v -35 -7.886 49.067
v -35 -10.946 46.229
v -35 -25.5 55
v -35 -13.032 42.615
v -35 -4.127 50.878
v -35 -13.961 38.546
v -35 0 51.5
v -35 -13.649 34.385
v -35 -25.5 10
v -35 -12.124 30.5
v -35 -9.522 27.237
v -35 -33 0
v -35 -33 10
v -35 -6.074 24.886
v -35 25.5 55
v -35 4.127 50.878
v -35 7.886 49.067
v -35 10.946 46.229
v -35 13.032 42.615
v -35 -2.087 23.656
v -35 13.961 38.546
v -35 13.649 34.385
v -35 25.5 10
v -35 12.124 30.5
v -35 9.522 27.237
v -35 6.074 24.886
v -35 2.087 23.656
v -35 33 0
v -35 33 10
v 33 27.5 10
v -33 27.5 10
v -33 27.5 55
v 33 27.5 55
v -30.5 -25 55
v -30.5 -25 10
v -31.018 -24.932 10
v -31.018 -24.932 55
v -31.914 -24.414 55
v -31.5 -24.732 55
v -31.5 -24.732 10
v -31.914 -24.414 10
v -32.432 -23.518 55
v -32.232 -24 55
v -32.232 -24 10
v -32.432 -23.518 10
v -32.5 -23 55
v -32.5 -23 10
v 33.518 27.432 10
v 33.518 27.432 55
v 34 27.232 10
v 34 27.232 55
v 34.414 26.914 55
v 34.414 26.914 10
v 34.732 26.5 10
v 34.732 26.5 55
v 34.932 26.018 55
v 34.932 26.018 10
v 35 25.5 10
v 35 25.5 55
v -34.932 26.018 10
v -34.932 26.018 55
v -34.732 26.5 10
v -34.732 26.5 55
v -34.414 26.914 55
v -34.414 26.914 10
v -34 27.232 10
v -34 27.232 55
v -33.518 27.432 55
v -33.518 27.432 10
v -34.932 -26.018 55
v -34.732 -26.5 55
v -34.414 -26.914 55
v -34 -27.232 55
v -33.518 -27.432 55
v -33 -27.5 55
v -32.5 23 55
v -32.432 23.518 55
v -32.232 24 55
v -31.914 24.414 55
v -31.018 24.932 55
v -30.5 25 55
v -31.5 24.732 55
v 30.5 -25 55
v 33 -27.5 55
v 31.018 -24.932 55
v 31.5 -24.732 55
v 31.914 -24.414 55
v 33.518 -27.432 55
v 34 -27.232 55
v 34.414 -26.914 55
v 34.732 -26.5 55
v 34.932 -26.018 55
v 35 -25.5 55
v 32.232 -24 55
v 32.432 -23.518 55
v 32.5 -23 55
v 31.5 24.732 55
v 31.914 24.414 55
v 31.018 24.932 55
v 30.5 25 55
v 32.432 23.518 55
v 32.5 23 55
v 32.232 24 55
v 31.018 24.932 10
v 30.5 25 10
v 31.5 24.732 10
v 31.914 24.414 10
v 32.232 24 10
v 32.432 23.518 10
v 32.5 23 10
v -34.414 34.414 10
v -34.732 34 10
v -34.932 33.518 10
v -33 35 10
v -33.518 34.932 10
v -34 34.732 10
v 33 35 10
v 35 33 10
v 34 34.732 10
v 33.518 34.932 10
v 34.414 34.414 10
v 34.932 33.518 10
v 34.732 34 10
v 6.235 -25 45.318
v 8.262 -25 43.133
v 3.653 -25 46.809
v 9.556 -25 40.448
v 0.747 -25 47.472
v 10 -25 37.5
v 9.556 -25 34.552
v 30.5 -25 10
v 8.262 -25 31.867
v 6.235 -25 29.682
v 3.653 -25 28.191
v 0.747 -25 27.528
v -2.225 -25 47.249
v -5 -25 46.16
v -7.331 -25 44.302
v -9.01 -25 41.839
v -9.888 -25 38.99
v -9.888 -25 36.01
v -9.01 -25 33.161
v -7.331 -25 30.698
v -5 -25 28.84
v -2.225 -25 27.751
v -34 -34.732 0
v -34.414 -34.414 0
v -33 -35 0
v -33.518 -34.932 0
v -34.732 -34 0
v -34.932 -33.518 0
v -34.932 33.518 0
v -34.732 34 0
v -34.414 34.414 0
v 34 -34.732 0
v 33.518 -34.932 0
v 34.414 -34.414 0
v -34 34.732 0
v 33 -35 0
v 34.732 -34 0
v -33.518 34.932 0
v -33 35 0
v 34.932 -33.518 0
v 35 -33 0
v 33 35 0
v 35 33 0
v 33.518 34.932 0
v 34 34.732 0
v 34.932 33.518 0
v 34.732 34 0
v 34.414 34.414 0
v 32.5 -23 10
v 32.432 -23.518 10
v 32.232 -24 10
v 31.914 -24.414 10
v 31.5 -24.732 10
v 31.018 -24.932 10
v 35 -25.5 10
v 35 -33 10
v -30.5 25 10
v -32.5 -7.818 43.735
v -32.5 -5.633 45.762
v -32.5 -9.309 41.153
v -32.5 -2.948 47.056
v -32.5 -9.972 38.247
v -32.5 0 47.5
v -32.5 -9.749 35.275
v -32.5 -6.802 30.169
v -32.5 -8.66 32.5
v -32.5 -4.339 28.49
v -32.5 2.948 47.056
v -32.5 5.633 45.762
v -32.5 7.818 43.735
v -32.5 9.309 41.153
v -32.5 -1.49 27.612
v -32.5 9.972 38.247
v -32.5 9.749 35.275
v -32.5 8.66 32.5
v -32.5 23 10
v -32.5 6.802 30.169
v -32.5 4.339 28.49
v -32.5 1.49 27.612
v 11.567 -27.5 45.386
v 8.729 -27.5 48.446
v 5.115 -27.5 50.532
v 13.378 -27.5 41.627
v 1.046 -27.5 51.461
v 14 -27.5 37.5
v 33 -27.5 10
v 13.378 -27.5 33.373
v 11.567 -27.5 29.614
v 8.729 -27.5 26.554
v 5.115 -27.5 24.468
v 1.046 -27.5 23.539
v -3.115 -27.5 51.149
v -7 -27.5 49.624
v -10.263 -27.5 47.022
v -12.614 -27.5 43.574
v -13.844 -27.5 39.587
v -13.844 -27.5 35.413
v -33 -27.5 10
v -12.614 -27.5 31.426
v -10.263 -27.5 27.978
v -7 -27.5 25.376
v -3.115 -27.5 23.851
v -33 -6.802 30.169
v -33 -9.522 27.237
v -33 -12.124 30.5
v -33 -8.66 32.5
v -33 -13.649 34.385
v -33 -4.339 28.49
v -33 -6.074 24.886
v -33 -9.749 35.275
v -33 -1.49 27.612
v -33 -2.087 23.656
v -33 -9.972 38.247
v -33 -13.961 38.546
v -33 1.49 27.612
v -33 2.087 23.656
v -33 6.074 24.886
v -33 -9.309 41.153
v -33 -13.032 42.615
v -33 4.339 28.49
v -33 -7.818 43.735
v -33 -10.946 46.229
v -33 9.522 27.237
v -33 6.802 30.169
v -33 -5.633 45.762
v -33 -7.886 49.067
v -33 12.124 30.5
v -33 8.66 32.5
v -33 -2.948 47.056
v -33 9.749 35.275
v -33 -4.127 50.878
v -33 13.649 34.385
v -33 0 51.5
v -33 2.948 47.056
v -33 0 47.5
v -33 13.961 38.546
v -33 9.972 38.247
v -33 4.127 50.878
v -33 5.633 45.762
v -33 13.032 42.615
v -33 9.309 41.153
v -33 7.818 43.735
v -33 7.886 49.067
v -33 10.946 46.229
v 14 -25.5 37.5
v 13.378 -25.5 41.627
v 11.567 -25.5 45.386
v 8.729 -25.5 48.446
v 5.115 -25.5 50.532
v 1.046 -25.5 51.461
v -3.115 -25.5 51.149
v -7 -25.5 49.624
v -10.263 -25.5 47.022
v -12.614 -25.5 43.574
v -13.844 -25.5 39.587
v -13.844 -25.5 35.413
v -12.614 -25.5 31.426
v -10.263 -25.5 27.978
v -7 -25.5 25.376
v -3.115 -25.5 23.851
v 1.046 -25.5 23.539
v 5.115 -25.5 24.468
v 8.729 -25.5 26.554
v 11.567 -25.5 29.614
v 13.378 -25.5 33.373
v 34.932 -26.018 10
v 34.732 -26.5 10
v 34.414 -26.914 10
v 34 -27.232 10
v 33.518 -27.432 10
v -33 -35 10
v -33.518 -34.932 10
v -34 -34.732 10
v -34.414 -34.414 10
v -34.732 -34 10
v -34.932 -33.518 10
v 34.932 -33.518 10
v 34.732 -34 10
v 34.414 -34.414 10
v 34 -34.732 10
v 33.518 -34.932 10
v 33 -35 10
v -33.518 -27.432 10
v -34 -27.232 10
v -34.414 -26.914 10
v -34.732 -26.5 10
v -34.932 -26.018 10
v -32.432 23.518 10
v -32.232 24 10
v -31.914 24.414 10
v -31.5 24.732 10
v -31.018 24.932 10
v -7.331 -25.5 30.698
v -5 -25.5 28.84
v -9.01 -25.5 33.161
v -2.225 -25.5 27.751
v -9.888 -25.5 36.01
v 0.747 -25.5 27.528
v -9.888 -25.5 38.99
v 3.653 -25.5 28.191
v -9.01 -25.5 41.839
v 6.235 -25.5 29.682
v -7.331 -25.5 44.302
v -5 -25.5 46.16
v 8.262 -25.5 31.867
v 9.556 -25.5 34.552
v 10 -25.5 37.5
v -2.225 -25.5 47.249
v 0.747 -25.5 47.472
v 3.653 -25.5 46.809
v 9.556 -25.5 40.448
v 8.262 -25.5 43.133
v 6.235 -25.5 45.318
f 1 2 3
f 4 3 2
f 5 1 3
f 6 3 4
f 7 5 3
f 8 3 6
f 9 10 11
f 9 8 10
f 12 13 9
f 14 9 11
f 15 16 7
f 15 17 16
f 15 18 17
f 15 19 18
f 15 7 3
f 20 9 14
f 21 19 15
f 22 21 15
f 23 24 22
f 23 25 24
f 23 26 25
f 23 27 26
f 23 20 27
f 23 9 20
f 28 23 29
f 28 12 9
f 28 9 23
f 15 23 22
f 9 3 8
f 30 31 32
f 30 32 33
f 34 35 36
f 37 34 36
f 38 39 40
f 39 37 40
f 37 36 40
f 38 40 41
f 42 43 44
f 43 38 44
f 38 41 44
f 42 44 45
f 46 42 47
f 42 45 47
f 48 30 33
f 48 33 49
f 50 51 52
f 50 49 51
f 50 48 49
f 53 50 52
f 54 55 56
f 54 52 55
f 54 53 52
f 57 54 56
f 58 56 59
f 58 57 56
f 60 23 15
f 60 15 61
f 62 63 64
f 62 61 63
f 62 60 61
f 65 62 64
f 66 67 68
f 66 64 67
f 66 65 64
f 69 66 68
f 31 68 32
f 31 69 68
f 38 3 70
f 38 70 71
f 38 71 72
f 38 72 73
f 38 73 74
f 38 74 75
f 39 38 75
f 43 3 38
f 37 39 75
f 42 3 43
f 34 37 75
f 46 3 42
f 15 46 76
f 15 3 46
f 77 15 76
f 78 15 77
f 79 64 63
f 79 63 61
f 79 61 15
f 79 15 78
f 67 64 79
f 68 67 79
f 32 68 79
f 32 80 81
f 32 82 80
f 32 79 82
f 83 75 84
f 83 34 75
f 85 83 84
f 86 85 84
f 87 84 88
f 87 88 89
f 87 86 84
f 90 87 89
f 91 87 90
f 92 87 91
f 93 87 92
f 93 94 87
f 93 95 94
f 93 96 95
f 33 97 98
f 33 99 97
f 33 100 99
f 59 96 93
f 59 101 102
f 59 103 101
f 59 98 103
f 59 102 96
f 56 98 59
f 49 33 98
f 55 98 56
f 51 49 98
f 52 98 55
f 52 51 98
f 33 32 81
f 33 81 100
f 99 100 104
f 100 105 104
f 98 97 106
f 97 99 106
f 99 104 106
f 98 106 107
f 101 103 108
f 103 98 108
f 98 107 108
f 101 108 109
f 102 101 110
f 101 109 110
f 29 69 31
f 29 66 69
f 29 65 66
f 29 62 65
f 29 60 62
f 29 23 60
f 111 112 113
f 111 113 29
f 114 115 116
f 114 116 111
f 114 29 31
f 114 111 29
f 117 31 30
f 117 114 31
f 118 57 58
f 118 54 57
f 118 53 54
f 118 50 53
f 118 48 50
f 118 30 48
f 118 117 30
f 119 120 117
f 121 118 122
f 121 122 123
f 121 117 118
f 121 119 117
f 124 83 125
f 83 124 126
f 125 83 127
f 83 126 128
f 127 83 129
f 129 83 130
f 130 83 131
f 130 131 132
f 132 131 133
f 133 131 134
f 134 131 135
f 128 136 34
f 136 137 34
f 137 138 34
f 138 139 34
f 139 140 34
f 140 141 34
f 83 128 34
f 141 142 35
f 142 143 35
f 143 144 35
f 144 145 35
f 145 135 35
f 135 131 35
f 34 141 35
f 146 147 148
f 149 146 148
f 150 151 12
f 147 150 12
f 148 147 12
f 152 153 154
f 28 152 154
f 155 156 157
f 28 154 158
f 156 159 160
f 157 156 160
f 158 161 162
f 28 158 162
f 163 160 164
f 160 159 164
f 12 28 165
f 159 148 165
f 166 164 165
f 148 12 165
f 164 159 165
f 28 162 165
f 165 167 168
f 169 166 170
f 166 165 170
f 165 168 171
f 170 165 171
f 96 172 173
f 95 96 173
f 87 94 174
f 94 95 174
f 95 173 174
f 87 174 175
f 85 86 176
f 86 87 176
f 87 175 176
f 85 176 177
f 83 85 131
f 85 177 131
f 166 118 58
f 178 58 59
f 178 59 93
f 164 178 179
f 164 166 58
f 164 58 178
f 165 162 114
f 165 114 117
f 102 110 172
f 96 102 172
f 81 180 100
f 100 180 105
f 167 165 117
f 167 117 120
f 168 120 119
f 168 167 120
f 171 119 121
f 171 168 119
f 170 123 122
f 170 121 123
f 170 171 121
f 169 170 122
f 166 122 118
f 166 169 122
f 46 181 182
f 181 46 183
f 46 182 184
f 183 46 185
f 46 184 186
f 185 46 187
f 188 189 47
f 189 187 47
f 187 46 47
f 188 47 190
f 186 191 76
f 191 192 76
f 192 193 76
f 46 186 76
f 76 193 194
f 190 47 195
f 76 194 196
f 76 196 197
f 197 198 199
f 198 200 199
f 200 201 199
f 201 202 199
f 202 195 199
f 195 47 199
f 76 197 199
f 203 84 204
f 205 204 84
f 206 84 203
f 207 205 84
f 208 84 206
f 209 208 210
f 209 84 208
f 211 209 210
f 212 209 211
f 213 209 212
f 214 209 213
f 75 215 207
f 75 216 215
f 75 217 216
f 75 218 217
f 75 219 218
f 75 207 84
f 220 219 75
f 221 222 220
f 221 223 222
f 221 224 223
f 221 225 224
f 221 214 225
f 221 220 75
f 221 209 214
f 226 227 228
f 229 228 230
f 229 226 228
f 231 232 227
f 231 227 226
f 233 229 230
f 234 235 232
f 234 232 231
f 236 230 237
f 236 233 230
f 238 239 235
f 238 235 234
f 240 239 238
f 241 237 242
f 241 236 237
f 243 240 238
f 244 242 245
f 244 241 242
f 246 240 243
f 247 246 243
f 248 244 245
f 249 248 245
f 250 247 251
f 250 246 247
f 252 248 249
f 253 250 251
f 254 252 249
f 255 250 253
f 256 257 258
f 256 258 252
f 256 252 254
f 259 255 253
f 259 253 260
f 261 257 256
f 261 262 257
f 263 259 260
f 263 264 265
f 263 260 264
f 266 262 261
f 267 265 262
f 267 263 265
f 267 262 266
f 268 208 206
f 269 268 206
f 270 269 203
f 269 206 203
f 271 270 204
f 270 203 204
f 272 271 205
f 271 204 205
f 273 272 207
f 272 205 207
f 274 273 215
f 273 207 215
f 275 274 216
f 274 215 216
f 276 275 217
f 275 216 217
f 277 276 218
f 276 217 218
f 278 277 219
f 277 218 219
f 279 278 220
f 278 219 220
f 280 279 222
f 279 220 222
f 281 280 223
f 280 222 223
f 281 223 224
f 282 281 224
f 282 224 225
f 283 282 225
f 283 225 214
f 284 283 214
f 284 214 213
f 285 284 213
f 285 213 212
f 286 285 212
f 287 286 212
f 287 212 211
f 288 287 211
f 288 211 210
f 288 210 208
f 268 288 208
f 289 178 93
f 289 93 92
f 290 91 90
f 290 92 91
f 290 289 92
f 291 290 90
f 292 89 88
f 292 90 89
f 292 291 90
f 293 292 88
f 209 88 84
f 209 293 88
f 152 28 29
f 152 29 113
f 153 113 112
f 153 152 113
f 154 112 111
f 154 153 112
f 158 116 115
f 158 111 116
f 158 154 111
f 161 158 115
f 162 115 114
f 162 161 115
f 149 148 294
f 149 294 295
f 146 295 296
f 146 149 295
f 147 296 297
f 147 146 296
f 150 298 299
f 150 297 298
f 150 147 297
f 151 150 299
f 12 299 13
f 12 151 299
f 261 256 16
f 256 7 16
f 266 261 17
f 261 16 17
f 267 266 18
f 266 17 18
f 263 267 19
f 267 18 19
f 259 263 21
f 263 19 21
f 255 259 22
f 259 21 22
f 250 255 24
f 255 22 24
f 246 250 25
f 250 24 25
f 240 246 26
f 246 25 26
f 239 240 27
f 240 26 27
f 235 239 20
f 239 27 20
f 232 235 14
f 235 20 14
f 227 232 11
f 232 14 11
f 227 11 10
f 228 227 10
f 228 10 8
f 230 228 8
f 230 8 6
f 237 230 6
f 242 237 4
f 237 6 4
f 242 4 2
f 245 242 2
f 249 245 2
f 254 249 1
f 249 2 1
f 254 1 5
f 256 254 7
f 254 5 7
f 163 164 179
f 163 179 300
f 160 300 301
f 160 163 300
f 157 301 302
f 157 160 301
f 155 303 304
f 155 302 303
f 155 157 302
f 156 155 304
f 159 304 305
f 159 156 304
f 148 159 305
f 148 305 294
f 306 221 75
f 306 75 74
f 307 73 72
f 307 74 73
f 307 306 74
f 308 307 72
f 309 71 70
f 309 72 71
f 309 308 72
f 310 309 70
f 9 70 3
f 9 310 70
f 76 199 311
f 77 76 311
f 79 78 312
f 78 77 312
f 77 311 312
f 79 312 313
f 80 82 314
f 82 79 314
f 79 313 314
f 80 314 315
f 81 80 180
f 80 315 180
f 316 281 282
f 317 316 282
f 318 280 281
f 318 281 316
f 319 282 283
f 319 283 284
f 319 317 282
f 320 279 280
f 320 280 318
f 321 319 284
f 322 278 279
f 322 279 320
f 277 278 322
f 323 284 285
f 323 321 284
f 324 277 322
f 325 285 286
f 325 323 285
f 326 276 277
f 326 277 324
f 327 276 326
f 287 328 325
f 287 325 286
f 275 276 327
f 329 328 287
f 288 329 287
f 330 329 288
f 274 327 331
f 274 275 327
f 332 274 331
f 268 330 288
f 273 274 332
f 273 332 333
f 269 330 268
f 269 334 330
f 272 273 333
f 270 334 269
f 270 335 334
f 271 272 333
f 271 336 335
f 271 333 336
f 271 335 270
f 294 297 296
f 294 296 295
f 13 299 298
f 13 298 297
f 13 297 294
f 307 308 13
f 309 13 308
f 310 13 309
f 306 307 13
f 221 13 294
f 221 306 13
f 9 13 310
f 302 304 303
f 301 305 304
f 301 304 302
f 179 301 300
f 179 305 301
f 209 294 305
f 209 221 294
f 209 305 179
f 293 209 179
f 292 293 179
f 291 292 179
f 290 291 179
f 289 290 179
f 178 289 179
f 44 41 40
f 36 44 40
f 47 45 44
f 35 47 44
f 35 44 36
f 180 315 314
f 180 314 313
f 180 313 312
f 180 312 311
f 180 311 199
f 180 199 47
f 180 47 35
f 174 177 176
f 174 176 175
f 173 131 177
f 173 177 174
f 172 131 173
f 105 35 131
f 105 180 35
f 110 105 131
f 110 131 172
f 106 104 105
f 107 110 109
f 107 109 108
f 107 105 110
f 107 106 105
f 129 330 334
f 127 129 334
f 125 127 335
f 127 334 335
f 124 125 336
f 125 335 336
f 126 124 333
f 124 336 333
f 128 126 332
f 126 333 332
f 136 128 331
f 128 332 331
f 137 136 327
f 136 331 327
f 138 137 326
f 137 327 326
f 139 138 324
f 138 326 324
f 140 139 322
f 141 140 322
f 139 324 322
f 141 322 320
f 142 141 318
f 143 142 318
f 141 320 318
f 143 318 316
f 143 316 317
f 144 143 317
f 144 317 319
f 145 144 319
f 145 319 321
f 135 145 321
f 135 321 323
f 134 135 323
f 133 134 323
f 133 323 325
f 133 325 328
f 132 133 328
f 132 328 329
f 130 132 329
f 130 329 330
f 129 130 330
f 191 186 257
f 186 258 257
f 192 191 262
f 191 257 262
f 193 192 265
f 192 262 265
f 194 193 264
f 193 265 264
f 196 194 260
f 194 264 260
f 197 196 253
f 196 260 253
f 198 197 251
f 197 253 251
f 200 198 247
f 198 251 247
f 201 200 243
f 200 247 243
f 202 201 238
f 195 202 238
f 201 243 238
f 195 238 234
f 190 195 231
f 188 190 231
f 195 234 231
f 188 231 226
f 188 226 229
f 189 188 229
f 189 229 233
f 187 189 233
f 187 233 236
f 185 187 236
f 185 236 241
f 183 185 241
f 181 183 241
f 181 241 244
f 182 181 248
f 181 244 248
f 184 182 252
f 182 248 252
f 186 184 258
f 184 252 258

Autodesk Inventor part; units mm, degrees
ref_plane "YZ Plane" through (0, 0, 0) normal (1, 0, 0) x (0, 1, 0)
ref_plane "XZ Plane" through (0, 0, 0) normal (0, 1, 0) x (-1, 0, 0)
ref_plane "XY Plane" through (0, 0, 0) normal (0, 0, 1) x (1, 0, 0)
sketch "Sketch1" plane through (0, 0, 0) normal (0, 0, 1) x (1, 0, 0)
  line L0 (-33, 35) -> (33, 35)
  line L1 (35, 33) -> (35, -33)
  line L2 (33, -35) -> (-33, -35)
  line L3 (-35, -33) -> (-35, 33)
  arc A0 (-35, -33) -> (-33, -35) centre (-33, -33) ccw
  arc A1 (-33, 35) -> (-35, 33) centre (-33, 33) ccw
  arc A2 (35, 33) -> (33, 35) centre (33, 33) ccw
  arc A3 (33, -35) -> (35, -33) centre (33, -33) ccw
  point P0 (0, 0)
  point P1 (-35, 35)
  point P2 (35, -35)
  point P3 (35, 35)
  point P4 (-35, -35)
  dimension "d0" = 70
  dimension "d1" = 35
  dimension "d2" = 70
  dimension "d3" = 35
  dimension "d85" = 2
extrude "Extrusion1" add sketch "Sketch1" along normal blind 10
sketch "Sketch3" plane through (0, 0, 10) normal (0, 0, 1) x (1, 0, 0)
  line L0 (-33, 27.5) -> (33, 27.5)
  line L1 (35, 25.5) -> (35, -25.5)
  line L2 (33, -27.5) -> (-33, -27.5)
  line L3 (-35, -25.5) -> (-35, 25.5)
  line L4 (-35, 33) -> (-35, -33) projected
  line L5 (-30.5, 25) -> (30.5, 25)
  line L6 (32.5, 23) -> (32.5, -23)
  line L7 (30.5, -25) -> (-30.5, -25)
  line L8 (-32.5, -23) -> (-32.5, 23)
  arc A0 (-35, -25.5) -> (-33, -27.5) centre (-33, -25.5) ccw
  arc A1 (-32.5, -23) -> (-30.5, -25) centre (-30.5, -23) ccw
  arc A2 (33, -27.5) -> (35, -25.5) centre (33, -25.5) ccw
  arc A3 (30.5, -25) -> (32.5, -23) centre (30.5, -23) ccw
  arc A4 (32.5, 23) -> (30.5, 25) centre (30.5, 23) ccw
  arc A5 (-30.5, 25) -> (-32.5, 23) centre (-30.5, 23) ccw
  arc A6 (-33, 27.5) -> (-35, 25.5) centre (-33, 25.5) ccw
  arc A7 (35, 25.5) -> (33, 27.5) centre (33, 25.5) ccw
  point P0 (0, 0)
  point P1 (-35, 27.5)
  point P2 (35, -27.5)
  point P3 (35, 27.5)
  point P4 (-35, -27.5)
  point P5 (-35, 35)
  point P6 (-35, -35)
  point P7 (-32.5, 25)
  point P8 (32.5, -25)
  point P9 (32.5, 25)
  point P10 (-32.5, -25)
  dimension "d17" = 70
  dimension "d18" = 55
  dimension "d19" = 27.5
  dimension "d20" = 2.5
  dimension "d21" = 2.5
  dimension "d22" = 2.5
  dimension "d23" = 2.5
  dimension "d86" = 2
extrude "Extrusion2" add sketch "Sketch3" along normal blind 45
sketch "Sketch9" plane through (-35, -27.5, 10) normal (0, -1, 0) x (1, 0, 0)
  circle A0 centre (35, 27.5) radius 14
  line L0 (0, 0) -> (0, 45) projected
  line L1 (2, 0) -> (68, 0) projected
  point P0 (35, -10)
  point P1 (70, 0)
  dimension "d60" = 28
  dimension "d61" = 35
  dimension "d62" = 27.5
extrude "Extrusion8" cut sketch "Sketch9" against normal blind 2
sketch "Sketch10" plane through (0, -25.5, 37.5) normal (0, -1, 0) x (1, 0, 0)
  circle A0 centre (0, 0) radius 10
  point P0 (0, -37.5)
  dimension "d65" = 20
extrude "Extrusion9" cut sketch "Sketch10" against normal blind 2
sketch "Sketch13" plane through (-35, -35, 0) normal (-1, 0, 0) x (0, 0, 1)
  circle A0 centre (37.5, 35) radius 14
  line L0 (0, 68) -> (0, 2) projected
  line L1 (10, 68) -> (10, 60.5) projected
  point P0 (0, 35)
  point P1 (0, 35)
  point P2 (0, 0)
  point P3 (0, 70)
  point P4 (10, 70)
  point P5 (10, 62.5)
  point P6 (10, 7.5)
  dimension "d76" = 28
  dimension "d82" = 27.5
extrude "Extrusion12" cut sketch "Sketch13" against normal blind 2
sketch "Sketch14" plane through (-33, 0, 37.5) normal (-1, 0, 0) x (0, 0, 1)
  circle A0 centre (0, 0) radius 10
  line L0 (-37.5, 33) -> (-37.5, -33) projected
  line L1 (-27.5, 33) -> (-27.5, 25.5) projected
  point P0 (-37.5, 0)
  point P1 (-37.5, 0)
  point P2 (-37.5, -35)
  point P3 (-37.5, 35)
  point P4 (-27.5, 35)
  point P5 (-27.5, 27.5)
  point P6 (-27.5, -27.5)
  dimension "d80" = 20
  dimension "d81" = 27.5
extrude "Extrusion13" cut sketch "Sketch14" against normal blind 2
equation "\"d1\" = 0.5 * d0"
equation "\"d3\" = 0.5 * d2"
equation "\"d19\" = 0.5 * d18"
equation "\"d21\" = d20"
properties part number "sampleChamber_singlePiece_filipeSample"
